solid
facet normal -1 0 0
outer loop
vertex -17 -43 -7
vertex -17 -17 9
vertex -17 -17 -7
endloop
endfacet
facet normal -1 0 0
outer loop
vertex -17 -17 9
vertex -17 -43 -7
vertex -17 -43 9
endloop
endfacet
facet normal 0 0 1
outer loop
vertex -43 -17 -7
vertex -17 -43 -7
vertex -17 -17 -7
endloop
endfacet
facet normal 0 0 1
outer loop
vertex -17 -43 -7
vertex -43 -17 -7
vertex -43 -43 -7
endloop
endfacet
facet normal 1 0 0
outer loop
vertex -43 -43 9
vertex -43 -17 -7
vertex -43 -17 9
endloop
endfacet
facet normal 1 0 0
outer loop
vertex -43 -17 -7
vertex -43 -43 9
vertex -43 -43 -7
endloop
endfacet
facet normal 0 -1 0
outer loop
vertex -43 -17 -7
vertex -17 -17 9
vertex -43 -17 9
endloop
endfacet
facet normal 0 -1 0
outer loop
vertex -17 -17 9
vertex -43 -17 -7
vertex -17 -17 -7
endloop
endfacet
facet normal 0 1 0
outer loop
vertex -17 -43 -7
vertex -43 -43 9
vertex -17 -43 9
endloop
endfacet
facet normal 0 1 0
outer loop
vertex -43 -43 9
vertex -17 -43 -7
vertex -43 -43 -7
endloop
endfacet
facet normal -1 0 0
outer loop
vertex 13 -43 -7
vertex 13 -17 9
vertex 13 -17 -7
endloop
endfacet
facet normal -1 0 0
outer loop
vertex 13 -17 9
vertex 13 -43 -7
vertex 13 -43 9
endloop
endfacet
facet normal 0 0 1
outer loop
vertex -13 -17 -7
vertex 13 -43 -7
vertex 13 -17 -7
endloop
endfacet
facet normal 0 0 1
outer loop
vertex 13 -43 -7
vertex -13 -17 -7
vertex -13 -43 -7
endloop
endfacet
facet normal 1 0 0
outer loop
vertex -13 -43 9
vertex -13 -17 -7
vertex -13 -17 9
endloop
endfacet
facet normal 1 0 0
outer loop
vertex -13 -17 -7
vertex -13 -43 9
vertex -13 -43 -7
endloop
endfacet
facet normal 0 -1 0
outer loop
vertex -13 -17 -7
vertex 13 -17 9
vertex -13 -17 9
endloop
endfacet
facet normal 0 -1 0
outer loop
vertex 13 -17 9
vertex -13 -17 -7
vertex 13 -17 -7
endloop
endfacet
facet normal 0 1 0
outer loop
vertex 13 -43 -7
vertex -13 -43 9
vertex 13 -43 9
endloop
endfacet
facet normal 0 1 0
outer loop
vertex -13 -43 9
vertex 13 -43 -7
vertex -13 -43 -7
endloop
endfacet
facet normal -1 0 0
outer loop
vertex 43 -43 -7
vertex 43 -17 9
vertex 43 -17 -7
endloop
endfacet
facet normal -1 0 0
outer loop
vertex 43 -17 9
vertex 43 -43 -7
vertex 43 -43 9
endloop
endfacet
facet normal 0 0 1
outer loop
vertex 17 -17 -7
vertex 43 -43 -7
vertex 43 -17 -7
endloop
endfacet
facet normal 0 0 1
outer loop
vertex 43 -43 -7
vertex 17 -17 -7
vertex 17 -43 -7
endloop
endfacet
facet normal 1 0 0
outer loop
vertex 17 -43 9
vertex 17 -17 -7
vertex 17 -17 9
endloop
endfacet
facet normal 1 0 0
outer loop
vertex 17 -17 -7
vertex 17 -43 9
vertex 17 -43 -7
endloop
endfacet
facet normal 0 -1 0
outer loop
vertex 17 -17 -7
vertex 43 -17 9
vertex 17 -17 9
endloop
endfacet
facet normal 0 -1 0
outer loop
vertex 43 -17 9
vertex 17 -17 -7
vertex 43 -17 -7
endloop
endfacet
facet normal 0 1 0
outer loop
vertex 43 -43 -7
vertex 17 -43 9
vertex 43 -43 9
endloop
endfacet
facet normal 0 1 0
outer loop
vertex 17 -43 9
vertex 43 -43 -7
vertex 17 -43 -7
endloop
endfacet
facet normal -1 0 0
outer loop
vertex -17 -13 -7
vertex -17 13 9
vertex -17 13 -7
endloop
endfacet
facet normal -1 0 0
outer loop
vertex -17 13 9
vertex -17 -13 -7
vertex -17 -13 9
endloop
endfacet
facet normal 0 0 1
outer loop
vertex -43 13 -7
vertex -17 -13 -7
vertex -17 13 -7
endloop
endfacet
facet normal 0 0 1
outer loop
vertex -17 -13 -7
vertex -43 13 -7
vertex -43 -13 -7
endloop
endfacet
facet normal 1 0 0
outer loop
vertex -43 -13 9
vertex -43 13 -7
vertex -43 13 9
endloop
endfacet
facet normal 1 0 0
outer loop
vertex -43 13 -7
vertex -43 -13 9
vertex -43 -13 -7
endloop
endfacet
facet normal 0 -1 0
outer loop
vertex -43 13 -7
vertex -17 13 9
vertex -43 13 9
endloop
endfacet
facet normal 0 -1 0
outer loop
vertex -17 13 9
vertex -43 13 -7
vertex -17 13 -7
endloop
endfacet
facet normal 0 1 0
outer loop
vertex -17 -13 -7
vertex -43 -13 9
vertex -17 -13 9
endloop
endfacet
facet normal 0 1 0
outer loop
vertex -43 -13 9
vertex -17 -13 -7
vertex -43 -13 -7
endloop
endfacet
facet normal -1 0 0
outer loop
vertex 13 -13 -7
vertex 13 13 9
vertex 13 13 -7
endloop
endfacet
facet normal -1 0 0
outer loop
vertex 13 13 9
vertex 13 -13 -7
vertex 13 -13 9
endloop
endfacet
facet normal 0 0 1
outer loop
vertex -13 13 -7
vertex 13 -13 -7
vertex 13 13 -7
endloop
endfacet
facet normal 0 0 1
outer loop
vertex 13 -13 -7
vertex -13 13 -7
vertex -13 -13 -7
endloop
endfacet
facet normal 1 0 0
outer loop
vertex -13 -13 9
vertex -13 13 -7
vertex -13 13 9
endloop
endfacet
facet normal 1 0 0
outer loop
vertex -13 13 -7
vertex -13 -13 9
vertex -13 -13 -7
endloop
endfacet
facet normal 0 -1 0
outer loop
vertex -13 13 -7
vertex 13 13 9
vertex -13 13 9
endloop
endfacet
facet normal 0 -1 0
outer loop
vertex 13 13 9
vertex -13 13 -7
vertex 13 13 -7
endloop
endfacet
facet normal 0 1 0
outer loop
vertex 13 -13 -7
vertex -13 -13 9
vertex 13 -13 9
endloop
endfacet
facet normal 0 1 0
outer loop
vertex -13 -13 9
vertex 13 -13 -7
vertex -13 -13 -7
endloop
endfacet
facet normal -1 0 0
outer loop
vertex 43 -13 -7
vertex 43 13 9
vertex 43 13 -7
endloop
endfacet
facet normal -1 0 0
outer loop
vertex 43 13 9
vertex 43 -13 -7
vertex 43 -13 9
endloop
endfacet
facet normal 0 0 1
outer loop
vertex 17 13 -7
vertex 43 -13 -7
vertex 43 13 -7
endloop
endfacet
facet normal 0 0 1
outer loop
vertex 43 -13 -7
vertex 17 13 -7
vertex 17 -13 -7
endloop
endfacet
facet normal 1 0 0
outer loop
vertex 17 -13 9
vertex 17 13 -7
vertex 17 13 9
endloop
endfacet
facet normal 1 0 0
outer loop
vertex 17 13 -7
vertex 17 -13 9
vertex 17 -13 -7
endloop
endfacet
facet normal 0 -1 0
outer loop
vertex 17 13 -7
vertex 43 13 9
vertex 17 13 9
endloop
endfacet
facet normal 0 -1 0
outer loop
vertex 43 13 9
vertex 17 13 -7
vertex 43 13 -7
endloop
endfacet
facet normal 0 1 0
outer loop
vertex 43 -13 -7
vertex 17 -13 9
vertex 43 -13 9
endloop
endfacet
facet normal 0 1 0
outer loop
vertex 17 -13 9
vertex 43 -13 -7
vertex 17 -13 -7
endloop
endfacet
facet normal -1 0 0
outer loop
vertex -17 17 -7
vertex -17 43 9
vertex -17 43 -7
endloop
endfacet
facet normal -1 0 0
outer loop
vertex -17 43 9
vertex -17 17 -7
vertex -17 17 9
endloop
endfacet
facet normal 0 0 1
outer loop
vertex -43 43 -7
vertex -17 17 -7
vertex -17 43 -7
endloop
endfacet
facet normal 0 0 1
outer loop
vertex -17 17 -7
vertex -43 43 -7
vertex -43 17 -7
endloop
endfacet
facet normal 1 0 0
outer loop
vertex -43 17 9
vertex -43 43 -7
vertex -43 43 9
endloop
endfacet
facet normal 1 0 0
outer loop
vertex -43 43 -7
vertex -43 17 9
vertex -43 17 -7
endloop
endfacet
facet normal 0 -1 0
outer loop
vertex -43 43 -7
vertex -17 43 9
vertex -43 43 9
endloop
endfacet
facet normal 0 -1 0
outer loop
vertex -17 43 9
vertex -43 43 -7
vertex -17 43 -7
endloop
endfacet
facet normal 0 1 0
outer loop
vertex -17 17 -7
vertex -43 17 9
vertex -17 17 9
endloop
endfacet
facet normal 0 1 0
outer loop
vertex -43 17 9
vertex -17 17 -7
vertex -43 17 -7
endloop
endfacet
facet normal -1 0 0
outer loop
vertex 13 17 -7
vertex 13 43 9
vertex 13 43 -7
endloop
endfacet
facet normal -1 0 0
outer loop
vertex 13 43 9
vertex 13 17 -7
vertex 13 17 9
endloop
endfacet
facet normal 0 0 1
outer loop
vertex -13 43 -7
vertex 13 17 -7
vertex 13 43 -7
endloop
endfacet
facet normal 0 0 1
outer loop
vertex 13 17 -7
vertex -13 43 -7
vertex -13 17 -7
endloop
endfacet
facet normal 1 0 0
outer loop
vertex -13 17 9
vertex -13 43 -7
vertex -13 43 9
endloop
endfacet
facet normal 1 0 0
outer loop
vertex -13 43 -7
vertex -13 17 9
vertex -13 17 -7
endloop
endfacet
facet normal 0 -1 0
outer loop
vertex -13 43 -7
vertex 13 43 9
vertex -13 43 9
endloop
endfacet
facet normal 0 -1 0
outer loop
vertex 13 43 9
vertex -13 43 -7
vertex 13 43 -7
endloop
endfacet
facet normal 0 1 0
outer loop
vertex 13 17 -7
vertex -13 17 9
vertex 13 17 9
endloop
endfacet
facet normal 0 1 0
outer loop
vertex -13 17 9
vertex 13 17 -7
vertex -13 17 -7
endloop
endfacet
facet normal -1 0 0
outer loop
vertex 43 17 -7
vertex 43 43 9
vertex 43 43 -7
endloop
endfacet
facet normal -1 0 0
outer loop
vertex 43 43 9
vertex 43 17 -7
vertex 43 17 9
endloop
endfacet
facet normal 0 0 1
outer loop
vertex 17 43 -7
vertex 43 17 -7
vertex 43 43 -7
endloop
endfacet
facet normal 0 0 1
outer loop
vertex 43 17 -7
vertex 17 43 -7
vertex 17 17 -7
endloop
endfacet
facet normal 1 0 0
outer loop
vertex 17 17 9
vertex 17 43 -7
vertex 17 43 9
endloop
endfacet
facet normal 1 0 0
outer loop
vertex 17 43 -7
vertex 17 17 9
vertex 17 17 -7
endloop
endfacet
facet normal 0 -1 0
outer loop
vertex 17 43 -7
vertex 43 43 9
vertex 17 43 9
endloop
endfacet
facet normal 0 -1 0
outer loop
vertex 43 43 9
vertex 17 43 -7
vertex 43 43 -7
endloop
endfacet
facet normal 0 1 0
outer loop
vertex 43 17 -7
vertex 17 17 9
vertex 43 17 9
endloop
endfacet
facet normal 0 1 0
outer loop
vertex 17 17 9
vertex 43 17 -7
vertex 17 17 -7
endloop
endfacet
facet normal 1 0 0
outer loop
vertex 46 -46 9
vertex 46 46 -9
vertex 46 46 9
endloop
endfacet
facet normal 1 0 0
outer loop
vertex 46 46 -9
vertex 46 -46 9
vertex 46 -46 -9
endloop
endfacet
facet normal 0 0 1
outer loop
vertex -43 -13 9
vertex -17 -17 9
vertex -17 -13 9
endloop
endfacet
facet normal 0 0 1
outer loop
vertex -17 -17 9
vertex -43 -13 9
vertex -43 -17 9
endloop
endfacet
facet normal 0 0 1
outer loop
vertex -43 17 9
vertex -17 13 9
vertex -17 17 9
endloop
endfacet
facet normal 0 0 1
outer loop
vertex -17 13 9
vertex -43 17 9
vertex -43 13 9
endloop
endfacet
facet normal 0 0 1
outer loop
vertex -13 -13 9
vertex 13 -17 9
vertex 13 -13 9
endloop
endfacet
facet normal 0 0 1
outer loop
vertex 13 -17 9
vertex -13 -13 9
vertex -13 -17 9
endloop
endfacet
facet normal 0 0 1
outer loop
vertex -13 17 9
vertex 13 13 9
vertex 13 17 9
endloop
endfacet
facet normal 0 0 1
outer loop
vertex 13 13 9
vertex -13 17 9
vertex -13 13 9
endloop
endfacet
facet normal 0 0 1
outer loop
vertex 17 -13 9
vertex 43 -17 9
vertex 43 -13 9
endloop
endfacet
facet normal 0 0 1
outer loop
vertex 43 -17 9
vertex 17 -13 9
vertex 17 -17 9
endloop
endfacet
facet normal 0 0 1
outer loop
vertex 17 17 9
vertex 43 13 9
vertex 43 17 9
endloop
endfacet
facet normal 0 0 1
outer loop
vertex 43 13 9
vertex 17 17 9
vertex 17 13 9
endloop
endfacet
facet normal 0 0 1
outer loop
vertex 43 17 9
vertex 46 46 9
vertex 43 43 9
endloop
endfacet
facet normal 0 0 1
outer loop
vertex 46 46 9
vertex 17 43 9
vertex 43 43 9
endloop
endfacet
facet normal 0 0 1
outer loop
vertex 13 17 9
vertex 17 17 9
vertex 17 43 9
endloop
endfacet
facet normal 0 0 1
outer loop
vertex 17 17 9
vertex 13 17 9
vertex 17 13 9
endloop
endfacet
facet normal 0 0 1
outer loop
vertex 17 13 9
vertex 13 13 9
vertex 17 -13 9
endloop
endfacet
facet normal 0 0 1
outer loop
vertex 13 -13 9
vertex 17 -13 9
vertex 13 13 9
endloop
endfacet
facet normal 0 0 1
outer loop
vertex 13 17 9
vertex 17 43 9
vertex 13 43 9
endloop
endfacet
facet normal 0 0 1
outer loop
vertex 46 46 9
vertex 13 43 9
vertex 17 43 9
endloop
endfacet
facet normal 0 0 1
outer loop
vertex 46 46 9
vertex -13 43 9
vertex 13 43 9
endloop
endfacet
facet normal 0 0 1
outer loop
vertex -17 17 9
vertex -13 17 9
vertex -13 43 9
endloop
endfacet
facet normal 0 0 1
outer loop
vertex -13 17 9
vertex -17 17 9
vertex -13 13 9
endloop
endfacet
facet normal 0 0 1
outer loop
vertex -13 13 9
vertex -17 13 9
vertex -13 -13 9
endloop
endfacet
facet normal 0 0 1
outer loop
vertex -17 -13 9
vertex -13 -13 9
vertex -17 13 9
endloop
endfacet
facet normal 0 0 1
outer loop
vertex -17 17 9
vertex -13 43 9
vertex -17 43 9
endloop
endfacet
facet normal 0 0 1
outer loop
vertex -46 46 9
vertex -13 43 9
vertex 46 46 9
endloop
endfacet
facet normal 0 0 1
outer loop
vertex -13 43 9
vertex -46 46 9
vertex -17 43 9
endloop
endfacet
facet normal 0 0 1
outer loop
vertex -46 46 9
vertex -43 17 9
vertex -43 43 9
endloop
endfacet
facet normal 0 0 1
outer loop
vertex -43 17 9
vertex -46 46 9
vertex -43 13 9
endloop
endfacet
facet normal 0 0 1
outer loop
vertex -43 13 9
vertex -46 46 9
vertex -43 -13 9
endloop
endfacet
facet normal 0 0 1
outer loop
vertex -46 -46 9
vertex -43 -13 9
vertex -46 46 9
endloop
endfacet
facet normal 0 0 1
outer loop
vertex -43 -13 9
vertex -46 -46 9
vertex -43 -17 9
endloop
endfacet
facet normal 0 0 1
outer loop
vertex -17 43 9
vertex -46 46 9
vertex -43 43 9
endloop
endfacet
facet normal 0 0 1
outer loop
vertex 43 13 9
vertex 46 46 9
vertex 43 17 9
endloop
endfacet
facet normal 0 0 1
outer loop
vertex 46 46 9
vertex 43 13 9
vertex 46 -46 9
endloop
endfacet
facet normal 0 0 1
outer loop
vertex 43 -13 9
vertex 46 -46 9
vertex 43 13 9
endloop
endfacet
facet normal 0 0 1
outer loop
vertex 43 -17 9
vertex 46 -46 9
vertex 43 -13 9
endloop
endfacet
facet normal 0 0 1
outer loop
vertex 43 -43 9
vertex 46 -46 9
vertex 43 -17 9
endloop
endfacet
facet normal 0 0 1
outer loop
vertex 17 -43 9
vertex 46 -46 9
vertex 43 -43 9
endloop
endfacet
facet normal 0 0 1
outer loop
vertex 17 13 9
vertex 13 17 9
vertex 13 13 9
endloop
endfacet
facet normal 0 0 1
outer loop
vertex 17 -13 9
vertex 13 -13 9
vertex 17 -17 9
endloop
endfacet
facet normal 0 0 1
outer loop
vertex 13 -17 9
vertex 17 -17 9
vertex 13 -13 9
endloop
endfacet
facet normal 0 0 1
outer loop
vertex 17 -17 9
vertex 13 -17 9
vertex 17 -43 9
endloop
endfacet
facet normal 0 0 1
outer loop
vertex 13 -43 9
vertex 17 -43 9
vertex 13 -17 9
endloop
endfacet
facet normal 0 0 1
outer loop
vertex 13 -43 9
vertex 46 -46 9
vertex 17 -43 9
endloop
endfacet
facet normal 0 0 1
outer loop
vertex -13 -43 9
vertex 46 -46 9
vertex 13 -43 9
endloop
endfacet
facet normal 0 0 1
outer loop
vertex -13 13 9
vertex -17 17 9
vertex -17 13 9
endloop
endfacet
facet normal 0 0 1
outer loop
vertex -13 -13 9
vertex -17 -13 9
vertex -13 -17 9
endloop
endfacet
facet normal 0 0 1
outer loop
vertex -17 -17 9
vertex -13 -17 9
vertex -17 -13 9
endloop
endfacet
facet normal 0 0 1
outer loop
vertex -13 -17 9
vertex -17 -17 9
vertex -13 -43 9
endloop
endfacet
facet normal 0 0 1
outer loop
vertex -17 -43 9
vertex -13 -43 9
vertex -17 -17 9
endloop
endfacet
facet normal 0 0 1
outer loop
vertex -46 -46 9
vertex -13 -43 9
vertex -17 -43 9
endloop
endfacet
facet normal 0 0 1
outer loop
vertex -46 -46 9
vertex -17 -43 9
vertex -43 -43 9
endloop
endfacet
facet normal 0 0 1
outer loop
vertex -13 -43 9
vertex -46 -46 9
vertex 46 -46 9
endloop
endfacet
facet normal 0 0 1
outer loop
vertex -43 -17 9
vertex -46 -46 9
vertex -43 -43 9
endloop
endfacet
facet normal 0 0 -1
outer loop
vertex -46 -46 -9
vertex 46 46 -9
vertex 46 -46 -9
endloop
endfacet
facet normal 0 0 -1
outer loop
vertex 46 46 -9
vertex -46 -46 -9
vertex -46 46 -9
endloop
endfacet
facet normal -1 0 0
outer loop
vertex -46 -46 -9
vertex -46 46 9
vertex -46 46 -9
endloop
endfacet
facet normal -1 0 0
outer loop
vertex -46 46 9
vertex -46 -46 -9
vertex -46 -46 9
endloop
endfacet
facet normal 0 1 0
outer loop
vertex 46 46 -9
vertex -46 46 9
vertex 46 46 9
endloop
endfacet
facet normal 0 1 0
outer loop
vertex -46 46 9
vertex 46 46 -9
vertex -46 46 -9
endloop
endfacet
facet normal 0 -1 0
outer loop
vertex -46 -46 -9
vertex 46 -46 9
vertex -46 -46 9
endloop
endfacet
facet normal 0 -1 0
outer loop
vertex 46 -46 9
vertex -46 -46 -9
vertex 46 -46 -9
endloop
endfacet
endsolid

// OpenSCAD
$fn = 32;

// ----------------------------------------------------------------------
// Pocket plate 92 x 92 x 18
// 3 x 3 pockets 26 mm square, 16 mm deep
// ----------------------------------------------------------------------

// --- parameters (mm) ---
thickness = 18;  // plate thickness
floor_t = 2;     // material left under each pocket
pocket = 26;     // pocket side length
pitch_x = 30;    // pocket pitch along X
pitch_y = 30;    // pocket pitch along Y
cols = 3;        // pockets per row
rows = 3;        // rows of pockets

// --- derived feature positions (mm) ---
depth = thickness - floor_t;        // = 16   pocket depth, down to the floor
span_x = (cols - 1) * pitch_x;      // = 60   distance between outer pockets
span_y = (rows - 1) * pitch_y;      // = 60   distance between outer pocket rows
origin_x = -span_x / 2;             // = -30   X of the first pocket
origin_y = -span_y / 2;             // = -30   Y of the first pocket
plate = [span_x + pocket + 6, span_y + pocket + 6, thickness];  // = [92, 92, 18]   overall size: pockets plus 3 mm of wall on each side
feature_centers = [
  [origin_x + 0 * pitch_x, origin_y + 0 * pitch_y],
  [origin_x + 1 * pitch_x, origin_y + 0 * pitch_y],
  [origin_x + 2 * pitch_x, origin_y + 0 * pitch_y],
  [origin_x + 0 * pitch_x, origin_y + 1 * pitch_y],
  [origin_x + 1 * pitch_x, origin_y + 1 * pitch_y],
  [origin_x + 2 * pitch_x, origin_y + 1 * pitch_y],
  [origin_x + 0 * pitch_x, origin_y + 2 * pitch_y],
  [origin_x + 1 * pitch_x, origin_y + 2 * pitch_y],
  [origin_x + 2 * pitch_x, origin_y + 2 * pitch_y]
];   // pocket centres, used verbatim by the cutter loop

// plate outline, then one pocket per centre in feature_centers
difference() {
  cube(plate, center = true);
  for (centre = feature_centers)
    translate([centre[0] - pocket / 2, centre[1] - pocket / 2, plate[2] / 2 - depth])
      cube([pocket, pocket, depth + 1]);  // centred on the declared pocket centre
}
